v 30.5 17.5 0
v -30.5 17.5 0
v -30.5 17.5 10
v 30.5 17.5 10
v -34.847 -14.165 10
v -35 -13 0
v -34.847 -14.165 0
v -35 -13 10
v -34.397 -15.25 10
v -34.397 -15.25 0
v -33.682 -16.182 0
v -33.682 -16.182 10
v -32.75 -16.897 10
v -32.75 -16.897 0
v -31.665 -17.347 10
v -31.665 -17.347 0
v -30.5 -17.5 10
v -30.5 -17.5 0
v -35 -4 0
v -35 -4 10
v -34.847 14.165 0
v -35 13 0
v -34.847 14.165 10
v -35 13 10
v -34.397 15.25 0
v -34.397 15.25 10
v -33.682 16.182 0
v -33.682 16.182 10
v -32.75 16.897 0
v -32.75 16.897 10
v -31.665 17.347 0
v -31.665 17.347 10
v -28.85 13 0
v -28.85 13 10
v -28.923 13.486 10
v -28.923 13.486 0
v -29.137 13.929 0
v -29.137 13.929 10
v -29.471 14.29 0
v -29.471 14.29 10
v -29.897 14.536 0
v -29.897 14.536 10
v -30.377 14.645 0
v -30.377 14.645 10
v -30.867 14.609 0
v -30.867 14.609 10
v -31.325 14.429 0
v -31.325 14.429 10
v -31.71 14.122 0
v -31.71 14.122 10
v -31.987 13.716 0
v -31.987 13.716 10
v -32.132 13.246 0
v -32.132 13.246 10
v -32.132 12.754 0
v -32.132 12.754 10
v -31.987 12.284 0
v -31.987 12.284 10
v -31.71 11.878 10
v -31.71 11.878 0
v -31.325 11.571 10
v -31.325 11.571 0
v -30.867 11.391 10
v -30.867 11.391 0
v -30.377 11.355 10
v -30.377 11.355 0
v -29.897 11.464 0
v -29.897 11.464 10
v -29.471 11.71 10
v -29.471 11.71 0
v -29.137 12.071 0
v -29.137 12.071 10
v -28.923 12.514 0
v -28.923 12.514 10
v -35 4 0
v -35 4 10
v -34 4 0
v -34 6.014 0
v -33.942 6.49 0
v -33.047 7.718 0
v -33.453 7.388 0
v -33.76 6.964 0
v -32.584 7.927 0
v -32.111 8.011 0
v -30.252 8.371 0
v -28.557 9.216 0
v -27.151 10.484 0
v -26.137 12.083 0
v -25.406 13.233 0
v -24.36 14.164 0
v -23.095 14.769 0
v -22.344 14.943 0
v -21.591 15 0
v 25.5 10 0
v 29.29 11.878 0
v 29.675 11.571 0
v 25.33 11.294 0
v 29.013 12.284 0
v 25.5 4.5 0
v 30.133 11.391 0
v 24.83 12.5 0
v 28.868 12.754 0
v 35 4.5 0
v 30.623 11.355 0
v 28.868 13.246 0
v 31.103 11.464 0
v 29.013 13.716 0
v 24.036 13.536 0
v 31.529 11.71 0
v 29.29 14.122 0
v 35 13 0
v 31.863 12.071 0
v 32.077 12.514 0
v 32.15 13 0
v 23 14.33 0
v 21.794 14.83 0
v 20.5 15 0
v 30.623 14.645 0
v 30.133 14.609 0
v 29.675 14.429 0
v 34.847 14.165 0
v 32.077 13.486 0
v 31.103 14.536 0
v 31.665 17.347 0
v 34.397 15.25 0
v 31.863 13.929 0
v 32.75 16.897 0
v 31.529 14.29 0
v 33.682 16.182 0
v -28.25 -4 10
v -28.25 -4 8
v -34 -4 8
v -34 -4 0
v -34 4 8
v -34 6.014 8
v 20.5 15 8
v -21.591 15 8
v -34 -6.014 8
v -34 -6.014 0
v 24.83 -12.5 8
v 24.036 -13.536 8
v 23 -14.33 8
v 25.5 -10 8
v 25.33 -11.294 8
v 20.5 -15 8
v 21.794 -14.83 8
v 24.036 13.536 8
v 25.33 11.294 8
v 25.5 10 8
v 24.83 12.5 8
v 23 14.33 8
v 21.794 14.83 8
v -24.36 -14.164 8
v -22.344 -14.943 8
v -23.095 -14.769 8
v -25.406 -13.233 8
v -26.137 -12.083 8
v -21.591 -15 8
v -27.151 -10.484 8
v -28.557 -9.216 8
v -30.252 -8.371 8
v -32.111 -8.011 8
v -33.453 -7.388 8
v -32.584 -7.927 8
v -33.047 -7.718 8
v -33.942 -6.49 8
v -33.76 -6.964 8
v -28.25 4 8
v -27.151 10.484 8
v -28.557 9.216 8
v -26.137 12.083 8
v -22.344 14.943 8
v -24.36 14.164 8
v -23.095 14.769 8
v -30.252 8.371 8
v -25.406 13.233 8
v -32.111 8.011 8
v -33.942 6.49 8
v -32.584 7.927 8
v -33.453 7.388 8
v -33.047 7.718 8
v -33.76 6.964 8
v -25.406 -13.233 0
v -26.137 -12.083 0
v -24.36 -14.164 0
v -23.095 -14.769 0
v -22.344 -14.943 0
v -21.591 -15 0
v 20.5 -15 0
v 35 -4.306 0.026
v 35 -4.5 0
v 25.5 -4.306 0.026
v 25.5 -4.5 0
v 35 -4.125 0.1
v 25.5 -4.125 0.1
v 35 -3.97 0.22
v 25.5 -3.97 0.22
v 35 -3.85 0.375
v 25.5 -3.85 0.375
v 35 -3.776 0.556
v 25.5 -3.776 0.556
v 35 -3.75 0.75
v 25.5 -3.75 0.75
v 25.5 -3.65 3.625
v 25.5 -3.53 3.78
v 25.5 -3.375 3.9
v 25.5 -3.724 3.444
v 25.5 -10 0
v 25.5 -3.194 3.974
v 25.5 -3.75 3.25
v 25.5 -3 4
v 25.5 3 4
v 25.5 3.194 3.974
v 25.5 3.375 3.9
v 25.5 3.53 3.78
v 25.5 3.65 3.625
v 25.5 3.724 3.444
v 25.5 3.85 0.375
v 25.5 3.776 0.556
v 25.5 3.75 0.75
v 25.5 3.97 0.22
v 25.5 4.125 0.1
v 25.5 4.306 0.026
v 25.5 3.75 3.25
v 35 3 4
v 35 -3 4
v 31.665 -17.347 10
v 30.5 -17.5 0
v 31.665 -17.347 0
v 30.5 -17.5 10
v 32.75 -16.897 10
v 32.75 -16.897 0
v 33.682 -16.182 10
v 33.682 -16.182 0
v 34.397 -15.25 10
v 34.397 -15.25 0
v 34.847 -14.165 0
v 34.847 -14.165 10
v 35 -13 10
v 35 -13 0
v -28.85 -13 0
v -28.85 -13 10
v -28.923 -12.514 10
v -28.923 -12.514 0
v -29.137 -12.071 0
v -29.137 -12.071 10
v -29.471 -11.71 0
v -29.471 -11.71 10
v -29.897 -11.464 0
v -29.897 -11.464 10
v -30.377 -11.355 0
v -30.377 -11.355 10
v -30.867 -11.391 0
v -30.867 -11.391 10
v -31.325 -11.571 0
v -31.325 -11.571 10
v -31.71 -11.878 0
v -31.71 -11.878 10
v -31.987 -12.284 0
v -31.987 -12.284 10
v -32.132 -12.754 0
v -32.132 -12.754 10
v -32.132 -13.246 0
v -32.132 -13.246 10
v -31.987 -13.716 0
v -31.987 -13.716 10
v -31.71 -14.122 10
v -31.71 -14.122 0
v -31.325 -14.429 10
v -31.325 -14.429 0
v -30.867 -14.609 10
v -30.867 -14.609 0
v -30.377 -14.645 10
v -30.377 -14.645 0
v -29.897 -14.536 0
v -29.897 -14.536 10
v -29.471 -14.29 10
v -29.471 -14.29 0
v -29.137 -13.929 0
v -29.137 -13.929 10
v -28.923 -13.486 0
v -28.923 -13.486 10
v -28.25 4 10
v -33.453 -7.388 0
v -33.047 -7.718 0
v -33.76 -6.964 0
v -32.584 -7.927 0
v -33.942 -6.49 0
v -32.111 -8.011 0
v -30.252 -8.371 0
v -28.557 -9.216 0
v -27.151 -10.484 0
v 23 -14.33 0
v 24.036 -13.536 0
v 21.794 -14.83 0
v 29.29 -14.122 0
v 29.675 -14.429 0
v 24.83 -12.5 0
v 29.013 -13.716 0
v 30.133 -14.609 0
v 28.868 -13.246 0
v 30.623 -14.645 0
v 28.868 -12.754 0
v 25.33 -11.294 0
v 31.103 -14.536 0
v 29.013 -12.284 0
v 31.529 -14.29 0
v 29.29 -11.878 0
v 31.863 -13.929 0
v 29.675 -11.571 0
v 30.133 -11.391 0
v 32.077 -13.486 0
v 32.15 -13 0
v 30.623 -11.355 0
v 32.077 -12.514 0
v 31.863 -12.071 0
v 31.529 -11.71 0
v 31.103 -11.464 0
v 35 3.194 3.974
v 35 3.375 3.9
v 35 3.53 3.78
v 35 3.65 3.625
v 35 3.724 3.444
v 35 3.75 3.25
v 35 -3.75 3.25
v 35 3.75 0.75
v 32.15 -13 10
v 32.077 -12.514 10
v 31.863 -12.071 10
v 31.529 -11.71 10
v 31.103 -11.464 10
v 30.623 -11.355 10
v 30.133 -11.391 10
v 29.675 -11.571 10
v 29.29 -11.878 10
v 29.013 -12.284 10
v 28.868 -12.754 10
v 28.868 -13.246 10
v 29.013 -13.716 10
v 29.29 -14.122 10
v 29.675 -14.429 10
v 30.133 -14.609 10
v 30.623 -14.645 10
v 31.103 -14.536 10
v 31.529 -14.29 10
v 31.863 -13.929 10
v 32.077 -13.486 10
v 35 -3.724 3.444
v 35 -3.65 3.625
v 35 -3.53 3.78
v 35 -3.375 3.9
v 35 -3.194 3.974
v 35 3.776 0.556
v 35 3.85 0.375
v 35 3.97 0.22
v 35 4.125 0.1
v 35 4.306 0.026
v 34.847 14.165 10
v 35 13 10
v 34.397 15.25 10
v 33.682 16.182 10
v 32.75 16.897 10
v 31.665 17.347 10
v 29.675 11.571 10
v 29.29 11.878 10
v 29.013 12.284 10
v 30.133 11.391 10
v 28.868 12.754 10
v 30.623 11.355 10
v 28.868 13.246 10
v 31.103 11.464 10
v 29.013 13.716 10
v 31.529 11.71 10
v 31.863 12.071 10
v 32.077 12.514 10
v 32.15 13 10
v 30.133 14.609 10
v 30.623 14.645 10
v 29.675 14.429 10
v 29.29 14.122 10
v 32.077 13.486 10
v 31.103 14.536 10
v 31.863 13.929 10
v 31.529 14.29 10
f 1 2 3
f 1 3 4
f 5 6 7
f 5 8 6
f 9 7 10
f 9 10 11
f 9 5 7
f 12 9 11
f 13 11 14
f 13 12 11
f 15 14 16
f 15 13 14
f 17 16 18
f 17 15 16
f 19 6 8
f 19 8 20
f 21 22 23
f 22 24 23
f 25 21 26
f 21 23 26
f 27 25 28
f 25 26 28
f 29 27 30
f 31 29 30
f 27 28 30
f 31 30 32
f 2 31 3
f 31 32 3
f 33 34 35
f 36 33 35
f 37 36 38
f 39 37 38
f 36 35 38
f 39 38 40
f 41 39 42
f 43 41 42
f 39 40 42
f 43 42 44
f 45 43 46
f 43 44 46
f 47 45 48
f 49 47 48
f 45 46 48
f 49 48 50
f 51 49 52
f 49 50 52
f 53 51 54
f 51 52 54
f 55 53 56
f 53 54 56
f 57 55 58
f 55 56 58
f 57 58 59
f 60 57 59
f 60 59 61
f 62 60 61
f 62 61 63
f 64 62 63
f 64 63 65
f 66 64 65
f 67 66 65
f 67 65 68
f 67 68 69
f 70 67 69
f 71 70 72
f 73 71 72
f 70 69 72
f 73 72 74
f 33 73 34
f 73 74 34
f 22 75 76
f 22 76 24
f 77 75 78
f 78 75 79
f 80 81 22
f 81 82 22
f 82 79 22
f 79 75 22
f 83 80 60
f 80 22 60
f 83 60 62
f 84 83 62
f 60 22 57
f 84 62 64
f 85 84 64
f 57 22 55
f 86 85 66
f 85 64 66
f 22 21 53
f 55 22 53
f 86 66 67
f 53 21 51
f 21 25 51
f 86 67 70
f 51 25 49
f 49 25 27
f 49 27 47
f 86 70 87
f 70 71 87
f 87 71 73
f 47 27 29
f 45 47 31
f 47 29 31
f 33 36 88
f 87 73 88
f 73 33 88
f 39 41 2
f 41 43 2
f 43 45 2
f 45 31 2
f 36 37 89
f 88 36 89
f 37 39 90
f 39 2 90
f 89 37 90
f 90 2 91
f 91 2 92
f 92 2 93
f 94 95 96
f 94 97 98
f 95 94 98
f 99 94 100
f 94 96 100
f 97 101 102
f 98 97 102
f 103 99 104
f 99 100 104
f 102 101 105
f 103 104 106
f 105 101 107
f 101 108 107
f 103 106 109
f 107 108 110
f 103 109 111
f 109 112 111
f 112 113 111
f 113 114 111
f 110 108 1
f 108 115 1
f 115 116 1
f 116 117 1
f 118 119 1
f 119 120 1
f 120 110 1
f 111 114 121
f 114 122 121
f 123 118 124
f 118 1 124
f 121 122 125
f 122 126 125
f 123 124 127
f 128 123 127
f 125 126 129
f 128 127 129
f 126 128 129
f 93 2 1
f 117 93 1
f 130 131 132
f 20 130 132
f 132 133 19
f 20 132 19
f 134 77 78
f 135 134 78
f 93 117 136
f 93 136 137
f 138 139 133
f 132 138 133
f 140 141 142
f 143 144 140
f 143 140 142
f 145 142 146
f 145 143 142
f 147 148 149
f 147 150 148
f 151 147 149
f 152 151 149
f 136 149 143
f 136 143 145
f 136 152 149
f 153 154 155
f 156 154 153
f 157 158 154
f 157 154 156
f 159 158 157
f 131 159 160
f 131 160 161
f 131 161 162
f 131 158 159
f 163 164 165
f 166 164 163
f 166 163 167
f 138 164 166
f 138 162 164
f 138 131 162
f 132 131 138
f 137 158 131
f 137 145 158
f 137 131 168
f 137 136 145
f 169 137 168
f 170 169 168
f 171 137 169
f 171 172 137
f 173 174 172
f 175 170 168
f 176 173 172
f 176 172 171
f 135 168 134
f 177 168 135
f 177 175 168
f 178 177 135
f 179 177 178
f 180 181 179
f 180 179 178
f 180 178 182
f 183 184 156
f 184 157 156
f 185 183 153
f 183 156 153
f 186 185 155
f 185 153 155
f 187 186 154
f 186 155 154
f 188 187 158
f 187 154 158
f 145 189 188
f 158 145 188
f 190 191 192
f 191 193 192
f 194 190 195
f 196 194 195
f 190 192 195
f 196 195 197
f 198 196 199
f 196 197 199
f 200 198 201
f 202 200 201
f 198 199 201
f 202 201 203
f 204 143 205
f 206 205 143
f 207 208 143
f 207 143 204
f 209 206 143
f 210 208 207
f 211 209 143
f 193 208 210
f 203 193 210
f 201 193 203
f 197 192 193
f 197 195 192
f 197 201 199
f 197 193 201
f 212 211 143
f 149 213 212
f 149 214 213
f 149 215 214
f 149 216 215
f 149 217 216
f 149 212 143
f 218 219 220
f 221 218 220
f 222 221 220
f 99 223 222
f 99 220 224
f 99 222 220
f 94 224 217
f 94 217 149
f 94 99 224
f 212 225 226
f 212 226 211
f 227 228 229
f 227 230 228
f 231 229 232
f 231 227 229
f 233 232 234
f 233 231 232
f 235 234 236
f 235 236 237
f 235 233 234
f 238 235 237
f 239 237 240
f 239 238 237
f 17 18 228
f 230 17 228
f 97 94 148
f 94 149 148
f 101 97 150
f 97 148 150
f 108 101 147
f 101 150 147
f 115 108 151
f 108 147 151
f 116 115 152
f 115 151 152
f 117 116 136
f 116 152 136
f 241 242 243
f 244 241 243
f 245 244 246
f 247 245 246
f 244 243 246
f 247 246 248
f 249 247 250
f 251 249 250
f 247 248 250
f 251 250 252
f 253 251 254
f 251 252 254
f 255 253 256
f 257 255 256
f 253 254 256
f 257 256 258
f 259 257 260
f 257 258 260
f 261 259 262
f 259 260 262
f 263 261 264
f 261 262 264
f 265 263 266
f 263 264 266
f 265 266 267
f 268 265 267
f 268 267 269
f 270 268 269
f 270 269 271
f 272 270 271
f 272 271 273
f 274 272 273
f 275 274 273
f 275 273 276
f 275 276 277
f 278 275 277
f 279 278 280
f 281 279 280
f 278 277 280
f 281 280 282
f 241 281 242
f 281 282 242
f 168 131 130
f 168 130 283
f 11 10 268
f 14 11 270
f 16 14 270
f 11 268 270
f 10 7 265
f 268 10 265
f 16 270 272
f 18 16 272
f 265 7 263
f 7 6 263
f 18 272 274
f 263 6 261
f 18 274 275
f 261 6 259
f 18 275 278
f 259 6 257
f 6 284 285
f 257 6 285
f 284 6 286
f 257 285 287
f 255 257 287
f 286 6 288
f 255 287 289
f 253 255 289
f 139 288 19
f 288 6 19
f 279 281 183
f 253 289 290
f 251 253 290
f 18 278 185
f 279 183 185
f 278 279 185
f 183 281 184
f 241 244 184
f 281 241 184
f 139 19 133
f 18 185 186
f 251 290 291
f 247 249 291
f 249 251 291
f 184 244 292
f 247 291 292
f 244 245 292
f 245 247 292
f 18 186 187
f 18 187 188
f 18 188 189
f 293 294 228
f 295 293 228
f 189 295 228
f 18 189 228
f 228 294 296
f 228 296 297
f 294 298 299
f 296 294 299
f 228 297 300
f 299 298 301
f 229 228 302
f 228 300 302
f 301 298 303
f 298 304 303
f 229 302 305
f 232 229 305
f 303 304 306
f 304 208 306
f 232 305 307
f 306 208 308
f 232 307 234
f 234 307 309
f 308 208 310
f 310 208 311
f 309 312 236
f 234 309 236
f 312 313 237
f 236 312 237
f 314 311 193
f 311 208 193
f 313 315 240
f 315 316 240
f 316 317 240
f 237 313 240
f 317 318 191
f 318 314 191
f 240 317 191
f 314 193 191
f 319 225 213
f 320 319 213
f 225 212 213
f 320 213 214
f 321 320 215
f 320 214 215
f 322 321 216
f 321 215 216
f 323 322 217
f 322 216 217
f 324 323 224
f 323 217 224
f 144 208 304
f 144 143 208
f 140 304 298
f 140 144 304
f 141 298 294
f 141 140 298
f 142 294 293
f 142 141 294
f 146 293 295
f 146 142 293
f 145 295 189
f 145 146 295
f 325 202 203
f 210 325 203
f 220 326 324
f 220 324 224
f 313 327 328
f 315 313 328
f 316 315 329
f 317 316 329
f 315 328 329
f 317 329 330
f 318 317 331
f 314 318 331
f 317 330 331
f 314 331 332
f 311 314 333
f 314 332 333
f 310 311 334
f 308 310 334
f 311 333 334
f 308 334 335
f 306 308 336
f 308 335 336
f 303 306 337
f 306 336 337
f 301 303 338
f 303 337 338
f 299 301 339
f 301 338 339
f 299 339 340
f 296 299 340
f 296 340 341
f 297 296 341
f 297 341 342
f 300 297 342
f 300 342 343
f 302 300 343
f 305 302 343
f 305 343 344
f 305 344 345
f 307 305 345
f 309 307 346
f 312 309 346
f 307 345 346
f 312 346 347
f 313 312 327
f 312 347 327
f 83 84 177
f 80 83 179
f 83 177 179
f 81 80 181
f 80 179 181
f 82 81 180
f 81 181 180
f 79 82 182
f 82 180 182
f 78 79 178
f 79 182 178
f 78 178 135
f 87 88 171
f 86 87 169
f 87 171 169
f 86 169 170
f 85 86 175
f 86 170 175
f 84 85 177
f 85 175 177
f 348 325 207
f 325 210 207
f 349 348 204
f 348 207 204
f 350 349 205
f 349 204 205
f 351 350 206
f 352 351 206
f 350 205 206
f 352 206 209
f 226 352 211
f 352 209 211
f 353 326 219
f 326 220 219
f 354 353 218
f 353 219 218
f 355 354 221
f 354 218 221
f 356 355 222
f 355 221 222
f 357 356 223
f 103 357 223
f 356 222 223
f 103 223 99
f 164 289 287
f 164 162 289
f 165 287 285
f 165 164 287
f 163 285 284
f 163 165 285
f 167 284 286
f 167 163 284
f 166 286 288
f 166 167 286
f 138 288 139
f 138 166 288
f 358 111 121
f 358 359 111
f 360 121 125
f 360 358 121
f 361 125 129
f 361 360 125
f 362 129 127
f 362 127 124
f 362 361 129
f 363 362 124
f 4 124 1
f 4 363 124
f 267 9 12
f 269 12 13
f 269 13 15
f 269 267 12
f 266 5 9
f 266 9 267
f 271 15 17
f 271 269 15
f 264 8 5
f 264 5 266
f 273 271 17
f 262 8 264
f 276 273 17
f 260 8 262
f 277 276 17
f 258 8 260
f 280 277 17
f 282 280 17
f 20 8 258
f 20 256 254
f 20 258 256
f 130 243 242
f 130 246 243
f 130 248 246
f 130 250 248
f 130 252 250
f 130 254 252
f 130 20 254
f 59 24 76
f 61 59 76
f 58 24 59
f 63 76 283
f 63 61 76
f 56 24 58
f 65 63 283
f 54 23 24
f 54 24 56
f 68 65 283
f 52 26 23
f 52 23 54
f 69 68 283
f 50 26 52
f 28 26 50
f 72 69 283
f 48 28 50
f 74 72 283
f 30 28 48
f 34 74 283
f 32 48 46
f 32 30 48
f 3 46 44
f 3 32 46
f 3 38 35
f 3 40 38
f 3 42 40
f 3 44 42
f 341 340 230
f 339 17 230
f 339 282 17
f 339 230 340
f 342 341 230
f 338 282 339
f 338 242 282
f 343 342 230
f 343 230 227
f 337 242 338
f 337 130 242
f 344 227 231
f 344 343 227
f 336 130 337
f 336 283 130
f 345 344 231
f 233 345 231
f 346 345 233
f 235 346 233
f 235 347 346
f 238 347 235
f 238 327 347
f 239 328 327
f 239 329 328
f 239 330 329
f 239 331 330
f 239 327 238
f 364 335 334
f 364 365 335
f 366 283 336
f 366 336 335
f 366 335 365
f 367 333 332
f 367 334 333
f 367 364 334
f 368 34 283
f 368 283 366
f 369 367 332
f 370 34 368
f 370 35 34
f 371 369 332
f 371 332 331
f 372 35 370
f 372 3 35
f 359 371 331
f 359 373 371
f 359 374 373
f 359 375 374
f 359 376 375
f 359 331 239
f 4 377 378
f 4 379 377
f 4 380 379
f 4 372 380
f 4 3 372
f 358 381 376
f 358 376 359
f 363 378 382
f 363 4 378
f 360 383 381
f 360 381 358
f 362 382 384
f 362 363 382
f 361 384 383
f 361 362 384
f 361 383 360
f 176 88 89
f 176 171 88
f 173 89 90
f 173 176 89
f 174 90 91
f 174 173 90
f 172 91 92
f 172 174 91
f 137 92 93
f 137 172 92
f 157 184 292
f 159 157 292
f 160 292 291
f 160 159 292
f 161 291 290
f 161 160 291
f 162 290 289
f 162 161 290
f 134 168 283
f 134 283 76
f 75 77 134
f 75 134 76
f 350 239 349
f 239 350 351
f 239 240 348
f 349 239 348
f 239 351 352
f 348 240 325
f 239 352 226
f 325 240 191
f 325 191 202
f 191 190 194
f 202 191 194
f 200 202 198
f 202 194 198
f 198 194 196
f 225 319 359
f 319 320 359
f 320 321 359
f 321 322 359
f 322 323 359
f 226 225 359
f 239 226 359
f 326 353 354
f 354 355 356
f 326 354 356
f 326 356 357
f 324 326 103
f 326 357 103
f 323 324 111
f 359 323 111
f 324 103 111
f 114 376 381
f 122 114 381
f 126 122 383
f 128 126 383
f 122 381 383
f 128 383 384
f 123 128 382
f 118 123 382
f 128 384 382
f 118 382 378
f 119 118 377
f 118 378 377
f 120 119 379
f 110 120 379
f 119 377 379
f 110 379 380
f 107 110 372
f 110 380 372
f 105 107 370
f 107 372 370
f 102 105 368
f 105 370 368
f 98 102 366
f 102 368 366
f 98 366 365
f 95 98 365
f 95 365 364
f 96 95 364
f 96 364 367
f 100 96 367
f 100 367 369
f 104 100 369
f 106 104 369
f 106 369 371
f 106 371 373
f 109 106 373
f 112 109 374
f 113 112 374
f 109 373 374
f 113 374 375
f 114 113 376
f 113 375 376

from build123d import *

# Parameters (mm, degrees)
SKETCH1_W           = 70
SKETCH1_H           = 35
BOSS_EXTRUDE1_DEPTH = 10
FILLET1_R           = 4.5
SKETCH2_R           = 1.65
CUT_EXTRUDE1_DEPTH  = 10
SKETCH3_W           = 51
SKETCH3_H           = 30
CUT_EXTRUDE2_DEPTH  = 8
SKETCH4_W           = 6.75
SKETCH4_H           = 8
CUT_EXTRUDE3_DEPTH  = 11
SKETCH5_W           = 8.5
SKETCH5_H           = 16
CUT_EXTRUDE5_DEPTH  = 8
SKETCH6_W           = 9.5
SKETCH6_H           = 7.5
CUT_EXTRUDE6_DEPTH  = 4
FILLET2_R           = 0.75
FILLET3_R           = 5
FILLET4_R           = 7
FILLET5_R           = 5
FILLET6_R           = 2


with BuildPart() as part:
    # Sketch1 → Boss-Extrude1 (new body)
    with BuildSketch(Plane.XY):
        Rectangle(SKETCH1_W, SKETCH1_H)
    extrude(amount=BOSS_EXTRUDE1_DEPTH)

    # Fillet1
    fillet1_edges = [part.edges().sort_by_distance(p)[0] for p in [
        (35, -17.5, 5),
        (-35, -17.5, 5),
        (-35, 17.5, 5),
        (35, 17.5, 5),
    ]]
    fillet(fillet1_edges, radius=FILLET1_R)

    # Sketch2 → Cut-Extrude1 (cut)
    with BuildSketch(Plane.XY.offset(10)):
        with Locations((-30.5, 13)):
            Circle(SKETCH2_R)
        with Locations((30.5, 13)):
            Circle(SKETCH2_R)
        with Locations((30.5, -13)):
            Circle(SKETCH2_R)
        with Locations((-30.5, -13)):
            Circle(SKETCH2_R)
    extrude(amount=-CUT_EXTRUDE1_DEPTH, mode=Mode.SUBTRACT)

    # Sketch3 → Cut-Extrude2 (cut)
    with BuildSketch(Plane(origin=(0, 0, 0), x_dir=(-1, 0, 0), z_dir=(0, 0, -1))):
        Rectangle(SKETCH3_W, SKETCH3_H)
    extrude(amount=-CUT_EXTRUDE2_DEPTH, mode=Mode.SUBTRACT)

    # Sketch4 → Cut-Extrude3 (cut)
    with BuildSketch(Plane(origin=(0, 0, 0), x_dir=(-1, 0, 0), z_dir=(0, 0, -1))):
        with Locations((31.625, 0)):
            Rectangle(SKETCH4_W, SKETCH4_H)
    extrude(amount=-CUT_EXTRUDE3_DEPTH, mode=Mode.SUBTRACT)

    # Sketch5 → Cut-Extrude5 (cut)
    with BuildSketch(Plane(origin=(0, 0, 0), x_dir=(-1, 0, 0), z_dir=(0, 0, -1))):
        with Locations((29.75, 0)):
            Rectangle(SKETCH5_W, SKETCH5_H)
    extrude(amount=-CUT_EXTRUDE5_DEPTH, mode=Mode.SUBTRACT)

    # Sketch6 → Cut-Extrude6 (cut)
    with BuildSketch(Plane(origin=(0, 0, 0), x_dir=(-1, 0, 0), z_dir=(0, 0, -1))):
        with Locations((-30.25, 0)):
            Rectangle(SKETCH6_W, SKETCH6_H)
    extrude(amount=-CUT_EXTRUDE6_DEPTH, mode=Mode.SUBTRACT)

    # Fillet2
    fillet2_edges = [part.edges().sort_by_distance(p)[0] for p in [
        (30.25, 3.75, 4),
        (30.25, -3.75, 4),
        (30.25, -3.75, 0),
        (30.25, 3.75, 0),
    ]]
    fillet(fillet2_edges, radius=FILLET2_R)

    # Fillet3
    fillet3_edges = [part.edges().sort_by_distance(p)[0] for p in [
        (25.5, -15, 4),
        (25.5, 15, 4),
    ]]
    fillet(fillet3_edges, radius=FILLET3_R)

    # Fillet4
    fillet4_edges = [part.edges().sort_by_distance(p)[0] for p in [
        (-25.5, -8, 4),
        (-25.5, 8, 4),
    ]]
    fillet(fillet4_edges, radius=FILLET4_R - 0.0001)  # a hair under: the kernel refuses the full size

    # Fillet5
    fillet5_edges = [part.edges().sort_by_distance(p)[0] for p in [
        (-25.5, 15, 4),
        (-25.5, -15, 4),
    ]]
    fillet(fillet5_edges, radius=FILLET5_R)

    # Fillet6
    fillet6_edges = [part.edges().sort_by_distance(p)[0] for p in [
        (-34, -8, 4),
        (-34, 8, 4),
    ]]
    fillet(fillet6_edges, radius=FILLET6_R)


solid = part.part
